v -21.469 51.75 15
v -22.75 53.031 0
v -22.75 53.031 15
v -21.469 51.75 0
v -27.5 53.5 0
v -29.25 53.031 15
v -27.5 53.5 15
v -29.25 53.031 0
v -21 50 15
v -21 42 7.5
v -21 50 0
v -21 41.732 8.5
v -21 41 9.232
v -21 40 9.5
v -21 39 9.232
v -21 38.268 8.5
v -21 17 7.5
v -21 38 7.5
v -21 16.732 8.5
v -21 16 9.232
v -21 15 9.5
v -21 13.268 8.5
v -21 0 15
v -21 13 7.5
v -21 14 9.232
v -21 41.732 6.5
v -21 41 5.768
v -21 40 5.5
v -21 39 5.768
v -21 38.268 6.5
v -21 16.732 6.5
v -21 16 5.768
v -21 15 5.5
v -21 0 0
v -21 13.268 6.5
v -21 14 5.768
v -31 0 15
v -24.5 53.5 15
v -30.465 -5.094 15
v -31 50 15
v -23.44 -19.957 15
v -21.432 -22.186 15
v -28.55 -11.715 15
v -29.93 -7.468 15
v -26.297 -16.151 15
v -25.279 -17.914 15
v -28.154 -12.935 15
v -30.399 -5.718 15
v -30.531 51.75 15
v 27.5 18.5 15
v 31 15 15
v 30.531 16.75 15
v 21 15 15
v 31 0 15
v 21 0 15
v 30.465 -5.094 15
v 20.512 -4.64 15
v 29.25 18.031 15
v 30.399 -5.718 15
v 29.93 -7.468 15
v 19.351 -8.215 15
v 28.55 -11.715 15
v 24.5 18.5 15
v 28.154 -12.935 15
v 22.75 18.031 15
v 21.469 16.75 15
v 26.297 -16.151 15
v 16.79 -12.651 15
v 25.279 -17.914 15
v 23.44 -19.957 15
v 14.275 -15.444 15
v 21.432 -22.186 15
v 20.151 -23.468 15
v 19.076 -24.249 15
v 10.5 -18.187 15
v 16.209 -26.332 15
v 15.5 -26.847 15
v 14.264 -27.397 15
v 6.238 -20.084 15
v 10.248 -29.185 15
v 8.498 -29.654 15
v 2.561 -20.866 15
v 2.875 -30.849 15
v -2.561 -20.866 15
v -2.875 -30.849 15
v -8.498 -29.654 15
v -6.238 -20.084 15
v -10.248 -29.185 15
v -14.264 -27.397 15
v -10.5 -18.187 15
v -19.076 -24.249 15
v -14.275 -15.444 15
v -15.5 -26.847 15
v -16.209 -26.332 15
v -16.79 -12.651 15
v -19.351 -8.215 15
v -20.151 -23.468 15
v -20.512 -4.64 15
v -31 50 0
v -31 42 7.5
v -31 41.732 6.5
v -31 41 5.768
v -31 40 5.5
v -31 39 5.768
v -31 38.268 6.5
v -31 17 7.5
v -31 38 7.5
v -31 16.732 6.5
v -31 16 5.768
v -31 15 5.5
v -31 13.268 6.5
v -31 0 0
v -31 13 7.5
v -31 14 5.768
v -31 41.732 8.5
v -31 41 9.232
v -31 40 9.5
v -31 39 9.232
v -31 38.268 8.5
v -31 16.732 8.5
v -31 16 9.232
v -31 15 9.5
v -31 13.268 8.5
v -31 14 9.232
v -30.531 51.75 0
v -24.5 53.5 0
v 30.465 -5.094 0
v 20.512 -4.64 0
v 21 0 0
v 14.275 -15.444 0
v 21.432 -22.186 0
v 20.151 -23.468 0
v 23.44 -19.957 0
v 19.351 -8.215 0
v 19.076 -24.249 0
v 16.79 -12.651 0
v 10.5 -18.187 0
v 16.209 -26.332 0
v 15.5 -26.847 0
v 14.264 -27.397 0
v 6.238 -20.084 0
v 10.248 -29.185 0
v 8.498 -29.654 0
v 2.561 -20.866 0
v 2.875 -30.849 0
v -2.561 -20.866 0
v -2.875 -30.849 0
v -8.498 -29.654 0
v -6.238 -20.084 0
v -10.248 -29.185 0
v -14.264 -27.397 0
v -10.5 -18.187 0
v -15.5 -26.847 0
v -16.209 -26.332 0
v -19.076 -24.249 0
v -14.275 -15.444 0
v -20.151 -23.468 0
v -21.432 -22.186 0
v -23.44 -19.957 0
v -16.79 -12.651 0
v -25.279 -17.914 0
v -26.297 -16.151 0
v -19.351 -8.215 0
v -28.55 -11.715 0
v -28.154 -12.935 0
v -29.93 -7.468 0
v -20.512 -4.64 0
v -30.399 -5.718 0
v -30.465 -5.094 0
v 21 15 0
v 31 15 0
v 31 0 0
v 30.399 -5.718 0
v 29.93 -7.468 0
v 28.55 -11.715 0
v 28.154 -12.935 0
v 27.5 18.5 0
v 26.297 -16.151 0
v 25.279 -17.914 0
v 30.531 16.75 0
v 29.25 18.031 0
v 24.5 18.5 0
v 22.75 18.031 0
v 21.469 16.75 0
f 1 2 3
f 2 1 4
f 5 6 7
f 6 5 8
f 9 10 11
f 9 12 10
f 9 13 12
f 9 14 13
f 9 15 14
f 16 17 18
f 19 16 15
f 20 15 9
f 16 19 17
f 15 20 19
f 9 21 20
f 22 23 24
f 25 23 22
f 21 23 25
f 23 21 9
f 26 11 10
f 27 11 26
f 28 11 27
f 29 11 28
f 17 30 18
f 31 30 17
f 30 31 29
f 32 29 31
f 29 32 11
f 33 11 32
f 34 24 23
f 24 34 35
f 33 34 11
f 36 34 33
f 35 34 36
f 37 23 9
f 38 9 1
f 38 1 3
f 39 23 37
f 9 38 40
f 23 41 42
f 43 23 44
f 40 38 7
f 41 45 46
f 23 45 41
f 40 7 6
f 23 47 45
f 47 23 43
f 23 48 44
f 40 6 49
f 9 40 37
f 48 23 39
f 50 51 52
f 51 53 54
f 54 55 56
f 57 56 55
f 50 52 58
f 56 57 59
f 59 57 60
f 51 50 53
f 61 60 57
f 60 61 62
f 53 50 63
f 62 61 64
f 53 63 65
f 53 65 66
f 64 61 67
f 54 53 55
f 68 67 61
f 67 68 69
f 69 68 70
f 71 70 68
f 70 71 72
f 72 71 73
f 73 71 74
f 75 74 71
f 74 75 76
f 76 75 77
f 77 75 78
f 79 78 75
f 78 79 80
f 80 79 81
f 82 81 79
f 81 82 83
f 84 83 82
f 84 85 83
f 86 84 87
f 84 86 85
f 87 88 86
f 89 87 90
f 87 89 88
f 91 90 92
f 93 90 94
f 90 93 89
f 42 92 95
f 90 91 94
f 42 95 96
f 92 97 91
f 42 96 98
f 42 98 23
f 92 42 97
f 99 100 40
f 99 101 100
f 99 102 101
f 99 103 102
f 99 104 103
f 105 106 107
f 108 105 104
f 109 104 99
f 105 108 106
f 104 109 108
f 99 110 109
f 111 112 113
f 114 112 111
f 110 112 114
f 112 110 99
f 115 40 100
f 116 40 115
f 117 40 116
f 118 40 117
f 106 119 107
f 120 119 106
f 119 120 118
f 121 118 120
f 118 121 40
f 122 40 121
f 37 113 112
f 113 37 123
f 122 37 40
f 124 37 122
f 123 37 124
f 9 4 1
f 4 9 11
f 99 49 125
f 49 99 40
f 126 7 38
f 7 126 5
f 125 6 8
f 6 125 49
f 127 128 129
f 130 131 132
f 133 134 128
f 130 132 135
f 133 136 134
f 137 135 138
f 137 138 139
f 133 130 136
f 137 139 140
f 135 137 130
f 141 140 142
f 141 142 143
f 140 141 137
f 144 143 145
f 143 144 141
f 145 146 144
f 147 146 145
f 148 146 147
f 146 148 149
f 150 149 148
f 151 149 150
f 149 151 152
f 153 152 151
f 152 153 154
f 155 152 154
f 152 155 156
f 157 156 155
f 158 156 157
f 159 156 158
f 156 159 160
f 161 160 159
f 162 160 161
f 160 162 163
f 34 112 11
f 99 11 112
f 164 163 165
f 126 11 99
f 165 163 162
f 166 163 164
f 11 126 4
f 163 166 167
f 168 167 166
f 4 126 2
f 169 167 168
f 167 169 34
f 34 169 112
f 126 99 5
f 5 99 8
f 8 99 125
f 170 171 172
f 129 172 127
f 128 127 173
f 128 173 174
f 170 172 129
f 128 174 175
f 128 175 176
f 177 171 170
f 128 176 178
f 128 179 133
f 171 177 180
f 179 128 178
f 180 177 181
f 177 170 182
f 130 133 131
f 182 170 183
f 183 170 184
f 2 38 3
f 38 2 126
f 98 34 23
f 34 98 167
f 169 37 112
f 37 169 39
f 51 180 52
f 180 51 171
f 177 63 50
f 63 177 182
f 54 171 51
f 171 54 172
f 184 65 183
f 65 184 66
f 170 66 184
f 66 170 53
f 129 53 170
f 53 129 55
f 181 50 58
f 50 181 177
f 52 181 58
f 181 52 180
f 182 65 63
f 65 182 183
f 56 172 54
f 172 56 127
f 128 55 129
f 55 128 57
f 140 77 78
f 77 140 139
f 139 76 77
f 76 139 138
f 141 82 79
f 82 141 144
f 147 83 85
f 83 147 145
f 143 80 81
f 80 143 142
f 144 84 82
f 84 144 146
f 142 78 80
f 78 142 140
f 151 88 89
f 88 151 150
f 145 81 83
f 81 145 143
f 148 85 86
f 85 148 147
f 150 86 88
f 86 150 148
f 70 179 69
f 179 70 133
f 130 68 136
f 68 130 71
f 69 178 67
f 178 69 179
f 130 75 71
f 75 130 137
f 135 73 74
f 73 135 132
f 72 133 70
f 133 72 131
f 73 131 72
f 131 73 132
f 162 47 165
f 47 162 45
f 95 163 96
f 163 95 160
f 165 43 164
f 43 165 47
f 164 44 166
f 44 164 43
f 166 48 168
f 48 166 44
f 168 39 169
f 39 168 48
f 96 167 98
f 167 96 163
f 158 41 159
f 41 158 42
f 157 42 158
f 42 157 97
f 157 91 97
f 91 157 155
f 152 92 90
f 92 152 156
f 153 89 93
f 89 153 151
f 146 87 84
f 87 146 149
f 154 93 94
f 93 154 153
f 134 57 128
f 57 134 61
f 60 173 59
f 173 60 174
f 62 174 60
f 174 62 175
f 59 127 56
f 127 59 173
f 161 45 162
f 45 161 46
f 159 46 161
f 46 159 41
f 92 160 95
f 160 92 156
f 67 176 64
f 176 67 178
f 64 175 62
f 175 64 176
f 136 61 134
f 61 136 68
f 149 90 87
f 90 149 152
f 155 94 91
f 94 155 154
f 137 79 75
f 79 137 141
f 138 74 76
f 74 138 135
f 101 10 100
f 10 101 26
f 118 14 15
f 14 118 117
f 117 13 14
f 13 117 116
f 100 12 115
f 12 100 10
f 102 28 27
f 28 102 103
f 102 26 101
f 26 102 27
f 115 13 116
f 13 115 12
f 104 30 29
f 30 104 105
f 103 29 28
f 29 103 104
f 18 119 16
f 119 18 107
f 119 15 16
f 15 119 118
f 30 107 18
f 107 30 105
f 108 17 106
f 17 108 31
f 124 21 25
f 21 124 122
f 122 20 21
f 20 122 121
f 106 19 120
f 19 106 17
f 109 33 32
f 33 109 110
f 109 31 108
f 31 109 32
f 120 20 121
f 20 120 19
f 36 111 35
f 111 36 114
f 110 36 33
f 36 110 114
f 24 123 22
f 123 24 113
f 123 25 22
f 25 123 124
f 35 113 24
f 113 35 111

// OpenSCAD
width=15;
thick=10;
rad=26;
roundrad=3.5; //less than thick/2
height=50;
theight=15;
roundsegs=12;

sthick=thick-roundrad*2;

wall_hook();

module wall_hook()
{
	difference(){
    	translate([0,0,0.5])

	minkowski(){
	union() {
		// hook
		difference() {
			cylinder(h=width-1, r=rad+sthick/2);
			translate(v=[0,0,-1]) cylinder(h=width+1, r=rad-sthick/2);
			translate(v=[-rad-sthick,0,-1]) cube(size=[2*rad+2*sthick,rad+sthick,width+4]);
		}
// wall 
		translate(v=[-rad-sthick/2,0,0]) cube(size=[sthick,height,width-1]);
// end-tip
		translate(v=[rad-sthick/2,0,0]) cube(size=[sthick,theight,width-1]);
	}
	cylinder(h=1,r=roundrad,$fn=roundsegs,center=true);
}


			// screw hole
	translate(v=[-rad,height-10,width/2]) rotate(a=[0,90,0]) cylinder(h=15, r=2, $fn=12,center=true);
	// translate(v=[-rad+thick/2,height-10,width/2]) rotate(a=[0,90,0]) cylinder(h=5, r1=1.5, r2=6,$fn=12,center=true);
if (height>30) {
	translate(v=[-rad,theight,width/2]) rotate(a=[0,90,0]) cylinder(h=15, r=2, $fn=12,center=true);
	// translate(v=[-rad+thick/2,theight,width/2]) rotate(a=[0,90,0]) cylinder(h=5, r1=1.5, r2=6,$fn=12,center=true);

}
}
}
